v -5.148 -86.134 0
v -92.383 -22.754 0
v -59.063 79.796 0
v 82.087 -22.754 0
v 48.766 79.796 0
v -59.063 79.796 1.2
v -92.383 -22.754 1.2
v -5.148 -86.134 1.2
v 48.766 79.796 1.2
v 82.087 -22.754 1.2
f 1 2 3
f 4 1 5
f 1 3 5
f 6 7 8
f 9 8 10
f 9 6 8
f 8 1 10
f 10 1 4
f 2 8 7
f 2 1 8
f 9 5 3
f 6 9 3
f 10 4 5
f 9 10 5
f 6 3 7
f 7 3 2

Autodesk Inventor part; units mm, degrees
ref_plane "YZ Plane" through (0, 0, 0) normal (1, 0, 0) x (0, 1, 0)
ref_plane "XZ Plane" through (0, 0, 0) normal (0, 1, 0) x (-1, 0, 0)
ref_plane "XY Plane" through (0, 0, 0) normal (0, 0, 1) x (1, 0, 0)
sketch "Boceto1" plane through (0, 0, 0) normal (0, 0, 1) x (1, 0, 0)
  line L0 (78.56, -21.6086) -> (46.5862, 76.7964) projected
  line L1 (82.0867, -22.7545) -> (78.56, -21.6086) projected
  line L2 (82.0867, -22.7545) -> (48.7659, 79.7964) projected
  line L3 (46.5862, 76.7964) -> (48.7659, 79.7964) projected
  line L4 (-5.1483, -82.4262) -> (78.56, -21.6086) projected
  line L5 (-5.1483, -86.1344) -> (-5.1483, -82.4262) projected
  line L6 (-5.1483, -86.1344) -> (82.0867, -22.7545) projected
  line L7 (78.56, -21.6086) -> (82.0867, -22.7545) projected
  line L8 (-88.8566, -21.6086) -> (-5.1483, -82.4262) projected
  line L9 (-88.8566, -21.6086) -> (-92.3834, -22.7545) projected
  line L10 (-5.1483, -86.1344) -> (-92.3834, -22.7545) projected
  line L11 (-5.1483, -86.1344) -> (-5.1483, -82.4262) projected
  line L12 (-56.8829, 76.7964) -> (-88.8566, -21.6086) projected
  line L13 (-59.0626, 79.7964) -> (-56.8829, 76.7964) projected
  line L14 (-59.0626, 79.7964) -> (-92.3834, -22.7545) projected
  line L15 (-88.8566, -21.6086) -> (-92.3834, -22.7545) projected
  line L16 (46.5862, 76.7964) -> (-56.8829, 76.7964) projected
  line L17 (48.7659, 79.7964) -> (46.5862, 76.7964) projected
  line L18 (48.7659, 79.7964) -> (-59.0626, 79.7964) projected
  line L19 (-56.8829, 76.7964) -> (-59.0626, 79.7964) projected
  circle A0 centre (-5.1483, 5.5899) radius 71.2065
  line L20 (-92.3834, -22.7545) -> (-59.0626, 79.7964)
  line L21 (-59.0626, 79.7964) -> (48.7659, 79.7964)
  line L22 (48.7659, 79.7964) -> (82.0867, -22.7545)
  line L23 (82.0867, -22.7545) -> (-5.1483, -86.1344)
  line L24 (-5.1483, -86.1344) -> (-92.3834, -22.7545)
  line L25 (-5.1483, -85.5164) -> (81.4989, -22.5635)
  line L26 (81.4989, -22.5635) -> (48.4026, 79.2964)
  line L27 (48.4026, 79.2964) -> (-58.6993, 79.2964)
  line L28 (-58.6993, 79.2964) -> (-91.7956, -22.5635)
  line L29 (-91.7956, -22.5635) -> (-5.1483, -85.5164)
  point P0 (0, 0)
  point P1 (-5.1483, 5.5899)
  dimension "d0" = 0.5
extrude "Extrusión1" add sketch "Boceto1" along normal blind 1.2
properties part number "Pentagono"
